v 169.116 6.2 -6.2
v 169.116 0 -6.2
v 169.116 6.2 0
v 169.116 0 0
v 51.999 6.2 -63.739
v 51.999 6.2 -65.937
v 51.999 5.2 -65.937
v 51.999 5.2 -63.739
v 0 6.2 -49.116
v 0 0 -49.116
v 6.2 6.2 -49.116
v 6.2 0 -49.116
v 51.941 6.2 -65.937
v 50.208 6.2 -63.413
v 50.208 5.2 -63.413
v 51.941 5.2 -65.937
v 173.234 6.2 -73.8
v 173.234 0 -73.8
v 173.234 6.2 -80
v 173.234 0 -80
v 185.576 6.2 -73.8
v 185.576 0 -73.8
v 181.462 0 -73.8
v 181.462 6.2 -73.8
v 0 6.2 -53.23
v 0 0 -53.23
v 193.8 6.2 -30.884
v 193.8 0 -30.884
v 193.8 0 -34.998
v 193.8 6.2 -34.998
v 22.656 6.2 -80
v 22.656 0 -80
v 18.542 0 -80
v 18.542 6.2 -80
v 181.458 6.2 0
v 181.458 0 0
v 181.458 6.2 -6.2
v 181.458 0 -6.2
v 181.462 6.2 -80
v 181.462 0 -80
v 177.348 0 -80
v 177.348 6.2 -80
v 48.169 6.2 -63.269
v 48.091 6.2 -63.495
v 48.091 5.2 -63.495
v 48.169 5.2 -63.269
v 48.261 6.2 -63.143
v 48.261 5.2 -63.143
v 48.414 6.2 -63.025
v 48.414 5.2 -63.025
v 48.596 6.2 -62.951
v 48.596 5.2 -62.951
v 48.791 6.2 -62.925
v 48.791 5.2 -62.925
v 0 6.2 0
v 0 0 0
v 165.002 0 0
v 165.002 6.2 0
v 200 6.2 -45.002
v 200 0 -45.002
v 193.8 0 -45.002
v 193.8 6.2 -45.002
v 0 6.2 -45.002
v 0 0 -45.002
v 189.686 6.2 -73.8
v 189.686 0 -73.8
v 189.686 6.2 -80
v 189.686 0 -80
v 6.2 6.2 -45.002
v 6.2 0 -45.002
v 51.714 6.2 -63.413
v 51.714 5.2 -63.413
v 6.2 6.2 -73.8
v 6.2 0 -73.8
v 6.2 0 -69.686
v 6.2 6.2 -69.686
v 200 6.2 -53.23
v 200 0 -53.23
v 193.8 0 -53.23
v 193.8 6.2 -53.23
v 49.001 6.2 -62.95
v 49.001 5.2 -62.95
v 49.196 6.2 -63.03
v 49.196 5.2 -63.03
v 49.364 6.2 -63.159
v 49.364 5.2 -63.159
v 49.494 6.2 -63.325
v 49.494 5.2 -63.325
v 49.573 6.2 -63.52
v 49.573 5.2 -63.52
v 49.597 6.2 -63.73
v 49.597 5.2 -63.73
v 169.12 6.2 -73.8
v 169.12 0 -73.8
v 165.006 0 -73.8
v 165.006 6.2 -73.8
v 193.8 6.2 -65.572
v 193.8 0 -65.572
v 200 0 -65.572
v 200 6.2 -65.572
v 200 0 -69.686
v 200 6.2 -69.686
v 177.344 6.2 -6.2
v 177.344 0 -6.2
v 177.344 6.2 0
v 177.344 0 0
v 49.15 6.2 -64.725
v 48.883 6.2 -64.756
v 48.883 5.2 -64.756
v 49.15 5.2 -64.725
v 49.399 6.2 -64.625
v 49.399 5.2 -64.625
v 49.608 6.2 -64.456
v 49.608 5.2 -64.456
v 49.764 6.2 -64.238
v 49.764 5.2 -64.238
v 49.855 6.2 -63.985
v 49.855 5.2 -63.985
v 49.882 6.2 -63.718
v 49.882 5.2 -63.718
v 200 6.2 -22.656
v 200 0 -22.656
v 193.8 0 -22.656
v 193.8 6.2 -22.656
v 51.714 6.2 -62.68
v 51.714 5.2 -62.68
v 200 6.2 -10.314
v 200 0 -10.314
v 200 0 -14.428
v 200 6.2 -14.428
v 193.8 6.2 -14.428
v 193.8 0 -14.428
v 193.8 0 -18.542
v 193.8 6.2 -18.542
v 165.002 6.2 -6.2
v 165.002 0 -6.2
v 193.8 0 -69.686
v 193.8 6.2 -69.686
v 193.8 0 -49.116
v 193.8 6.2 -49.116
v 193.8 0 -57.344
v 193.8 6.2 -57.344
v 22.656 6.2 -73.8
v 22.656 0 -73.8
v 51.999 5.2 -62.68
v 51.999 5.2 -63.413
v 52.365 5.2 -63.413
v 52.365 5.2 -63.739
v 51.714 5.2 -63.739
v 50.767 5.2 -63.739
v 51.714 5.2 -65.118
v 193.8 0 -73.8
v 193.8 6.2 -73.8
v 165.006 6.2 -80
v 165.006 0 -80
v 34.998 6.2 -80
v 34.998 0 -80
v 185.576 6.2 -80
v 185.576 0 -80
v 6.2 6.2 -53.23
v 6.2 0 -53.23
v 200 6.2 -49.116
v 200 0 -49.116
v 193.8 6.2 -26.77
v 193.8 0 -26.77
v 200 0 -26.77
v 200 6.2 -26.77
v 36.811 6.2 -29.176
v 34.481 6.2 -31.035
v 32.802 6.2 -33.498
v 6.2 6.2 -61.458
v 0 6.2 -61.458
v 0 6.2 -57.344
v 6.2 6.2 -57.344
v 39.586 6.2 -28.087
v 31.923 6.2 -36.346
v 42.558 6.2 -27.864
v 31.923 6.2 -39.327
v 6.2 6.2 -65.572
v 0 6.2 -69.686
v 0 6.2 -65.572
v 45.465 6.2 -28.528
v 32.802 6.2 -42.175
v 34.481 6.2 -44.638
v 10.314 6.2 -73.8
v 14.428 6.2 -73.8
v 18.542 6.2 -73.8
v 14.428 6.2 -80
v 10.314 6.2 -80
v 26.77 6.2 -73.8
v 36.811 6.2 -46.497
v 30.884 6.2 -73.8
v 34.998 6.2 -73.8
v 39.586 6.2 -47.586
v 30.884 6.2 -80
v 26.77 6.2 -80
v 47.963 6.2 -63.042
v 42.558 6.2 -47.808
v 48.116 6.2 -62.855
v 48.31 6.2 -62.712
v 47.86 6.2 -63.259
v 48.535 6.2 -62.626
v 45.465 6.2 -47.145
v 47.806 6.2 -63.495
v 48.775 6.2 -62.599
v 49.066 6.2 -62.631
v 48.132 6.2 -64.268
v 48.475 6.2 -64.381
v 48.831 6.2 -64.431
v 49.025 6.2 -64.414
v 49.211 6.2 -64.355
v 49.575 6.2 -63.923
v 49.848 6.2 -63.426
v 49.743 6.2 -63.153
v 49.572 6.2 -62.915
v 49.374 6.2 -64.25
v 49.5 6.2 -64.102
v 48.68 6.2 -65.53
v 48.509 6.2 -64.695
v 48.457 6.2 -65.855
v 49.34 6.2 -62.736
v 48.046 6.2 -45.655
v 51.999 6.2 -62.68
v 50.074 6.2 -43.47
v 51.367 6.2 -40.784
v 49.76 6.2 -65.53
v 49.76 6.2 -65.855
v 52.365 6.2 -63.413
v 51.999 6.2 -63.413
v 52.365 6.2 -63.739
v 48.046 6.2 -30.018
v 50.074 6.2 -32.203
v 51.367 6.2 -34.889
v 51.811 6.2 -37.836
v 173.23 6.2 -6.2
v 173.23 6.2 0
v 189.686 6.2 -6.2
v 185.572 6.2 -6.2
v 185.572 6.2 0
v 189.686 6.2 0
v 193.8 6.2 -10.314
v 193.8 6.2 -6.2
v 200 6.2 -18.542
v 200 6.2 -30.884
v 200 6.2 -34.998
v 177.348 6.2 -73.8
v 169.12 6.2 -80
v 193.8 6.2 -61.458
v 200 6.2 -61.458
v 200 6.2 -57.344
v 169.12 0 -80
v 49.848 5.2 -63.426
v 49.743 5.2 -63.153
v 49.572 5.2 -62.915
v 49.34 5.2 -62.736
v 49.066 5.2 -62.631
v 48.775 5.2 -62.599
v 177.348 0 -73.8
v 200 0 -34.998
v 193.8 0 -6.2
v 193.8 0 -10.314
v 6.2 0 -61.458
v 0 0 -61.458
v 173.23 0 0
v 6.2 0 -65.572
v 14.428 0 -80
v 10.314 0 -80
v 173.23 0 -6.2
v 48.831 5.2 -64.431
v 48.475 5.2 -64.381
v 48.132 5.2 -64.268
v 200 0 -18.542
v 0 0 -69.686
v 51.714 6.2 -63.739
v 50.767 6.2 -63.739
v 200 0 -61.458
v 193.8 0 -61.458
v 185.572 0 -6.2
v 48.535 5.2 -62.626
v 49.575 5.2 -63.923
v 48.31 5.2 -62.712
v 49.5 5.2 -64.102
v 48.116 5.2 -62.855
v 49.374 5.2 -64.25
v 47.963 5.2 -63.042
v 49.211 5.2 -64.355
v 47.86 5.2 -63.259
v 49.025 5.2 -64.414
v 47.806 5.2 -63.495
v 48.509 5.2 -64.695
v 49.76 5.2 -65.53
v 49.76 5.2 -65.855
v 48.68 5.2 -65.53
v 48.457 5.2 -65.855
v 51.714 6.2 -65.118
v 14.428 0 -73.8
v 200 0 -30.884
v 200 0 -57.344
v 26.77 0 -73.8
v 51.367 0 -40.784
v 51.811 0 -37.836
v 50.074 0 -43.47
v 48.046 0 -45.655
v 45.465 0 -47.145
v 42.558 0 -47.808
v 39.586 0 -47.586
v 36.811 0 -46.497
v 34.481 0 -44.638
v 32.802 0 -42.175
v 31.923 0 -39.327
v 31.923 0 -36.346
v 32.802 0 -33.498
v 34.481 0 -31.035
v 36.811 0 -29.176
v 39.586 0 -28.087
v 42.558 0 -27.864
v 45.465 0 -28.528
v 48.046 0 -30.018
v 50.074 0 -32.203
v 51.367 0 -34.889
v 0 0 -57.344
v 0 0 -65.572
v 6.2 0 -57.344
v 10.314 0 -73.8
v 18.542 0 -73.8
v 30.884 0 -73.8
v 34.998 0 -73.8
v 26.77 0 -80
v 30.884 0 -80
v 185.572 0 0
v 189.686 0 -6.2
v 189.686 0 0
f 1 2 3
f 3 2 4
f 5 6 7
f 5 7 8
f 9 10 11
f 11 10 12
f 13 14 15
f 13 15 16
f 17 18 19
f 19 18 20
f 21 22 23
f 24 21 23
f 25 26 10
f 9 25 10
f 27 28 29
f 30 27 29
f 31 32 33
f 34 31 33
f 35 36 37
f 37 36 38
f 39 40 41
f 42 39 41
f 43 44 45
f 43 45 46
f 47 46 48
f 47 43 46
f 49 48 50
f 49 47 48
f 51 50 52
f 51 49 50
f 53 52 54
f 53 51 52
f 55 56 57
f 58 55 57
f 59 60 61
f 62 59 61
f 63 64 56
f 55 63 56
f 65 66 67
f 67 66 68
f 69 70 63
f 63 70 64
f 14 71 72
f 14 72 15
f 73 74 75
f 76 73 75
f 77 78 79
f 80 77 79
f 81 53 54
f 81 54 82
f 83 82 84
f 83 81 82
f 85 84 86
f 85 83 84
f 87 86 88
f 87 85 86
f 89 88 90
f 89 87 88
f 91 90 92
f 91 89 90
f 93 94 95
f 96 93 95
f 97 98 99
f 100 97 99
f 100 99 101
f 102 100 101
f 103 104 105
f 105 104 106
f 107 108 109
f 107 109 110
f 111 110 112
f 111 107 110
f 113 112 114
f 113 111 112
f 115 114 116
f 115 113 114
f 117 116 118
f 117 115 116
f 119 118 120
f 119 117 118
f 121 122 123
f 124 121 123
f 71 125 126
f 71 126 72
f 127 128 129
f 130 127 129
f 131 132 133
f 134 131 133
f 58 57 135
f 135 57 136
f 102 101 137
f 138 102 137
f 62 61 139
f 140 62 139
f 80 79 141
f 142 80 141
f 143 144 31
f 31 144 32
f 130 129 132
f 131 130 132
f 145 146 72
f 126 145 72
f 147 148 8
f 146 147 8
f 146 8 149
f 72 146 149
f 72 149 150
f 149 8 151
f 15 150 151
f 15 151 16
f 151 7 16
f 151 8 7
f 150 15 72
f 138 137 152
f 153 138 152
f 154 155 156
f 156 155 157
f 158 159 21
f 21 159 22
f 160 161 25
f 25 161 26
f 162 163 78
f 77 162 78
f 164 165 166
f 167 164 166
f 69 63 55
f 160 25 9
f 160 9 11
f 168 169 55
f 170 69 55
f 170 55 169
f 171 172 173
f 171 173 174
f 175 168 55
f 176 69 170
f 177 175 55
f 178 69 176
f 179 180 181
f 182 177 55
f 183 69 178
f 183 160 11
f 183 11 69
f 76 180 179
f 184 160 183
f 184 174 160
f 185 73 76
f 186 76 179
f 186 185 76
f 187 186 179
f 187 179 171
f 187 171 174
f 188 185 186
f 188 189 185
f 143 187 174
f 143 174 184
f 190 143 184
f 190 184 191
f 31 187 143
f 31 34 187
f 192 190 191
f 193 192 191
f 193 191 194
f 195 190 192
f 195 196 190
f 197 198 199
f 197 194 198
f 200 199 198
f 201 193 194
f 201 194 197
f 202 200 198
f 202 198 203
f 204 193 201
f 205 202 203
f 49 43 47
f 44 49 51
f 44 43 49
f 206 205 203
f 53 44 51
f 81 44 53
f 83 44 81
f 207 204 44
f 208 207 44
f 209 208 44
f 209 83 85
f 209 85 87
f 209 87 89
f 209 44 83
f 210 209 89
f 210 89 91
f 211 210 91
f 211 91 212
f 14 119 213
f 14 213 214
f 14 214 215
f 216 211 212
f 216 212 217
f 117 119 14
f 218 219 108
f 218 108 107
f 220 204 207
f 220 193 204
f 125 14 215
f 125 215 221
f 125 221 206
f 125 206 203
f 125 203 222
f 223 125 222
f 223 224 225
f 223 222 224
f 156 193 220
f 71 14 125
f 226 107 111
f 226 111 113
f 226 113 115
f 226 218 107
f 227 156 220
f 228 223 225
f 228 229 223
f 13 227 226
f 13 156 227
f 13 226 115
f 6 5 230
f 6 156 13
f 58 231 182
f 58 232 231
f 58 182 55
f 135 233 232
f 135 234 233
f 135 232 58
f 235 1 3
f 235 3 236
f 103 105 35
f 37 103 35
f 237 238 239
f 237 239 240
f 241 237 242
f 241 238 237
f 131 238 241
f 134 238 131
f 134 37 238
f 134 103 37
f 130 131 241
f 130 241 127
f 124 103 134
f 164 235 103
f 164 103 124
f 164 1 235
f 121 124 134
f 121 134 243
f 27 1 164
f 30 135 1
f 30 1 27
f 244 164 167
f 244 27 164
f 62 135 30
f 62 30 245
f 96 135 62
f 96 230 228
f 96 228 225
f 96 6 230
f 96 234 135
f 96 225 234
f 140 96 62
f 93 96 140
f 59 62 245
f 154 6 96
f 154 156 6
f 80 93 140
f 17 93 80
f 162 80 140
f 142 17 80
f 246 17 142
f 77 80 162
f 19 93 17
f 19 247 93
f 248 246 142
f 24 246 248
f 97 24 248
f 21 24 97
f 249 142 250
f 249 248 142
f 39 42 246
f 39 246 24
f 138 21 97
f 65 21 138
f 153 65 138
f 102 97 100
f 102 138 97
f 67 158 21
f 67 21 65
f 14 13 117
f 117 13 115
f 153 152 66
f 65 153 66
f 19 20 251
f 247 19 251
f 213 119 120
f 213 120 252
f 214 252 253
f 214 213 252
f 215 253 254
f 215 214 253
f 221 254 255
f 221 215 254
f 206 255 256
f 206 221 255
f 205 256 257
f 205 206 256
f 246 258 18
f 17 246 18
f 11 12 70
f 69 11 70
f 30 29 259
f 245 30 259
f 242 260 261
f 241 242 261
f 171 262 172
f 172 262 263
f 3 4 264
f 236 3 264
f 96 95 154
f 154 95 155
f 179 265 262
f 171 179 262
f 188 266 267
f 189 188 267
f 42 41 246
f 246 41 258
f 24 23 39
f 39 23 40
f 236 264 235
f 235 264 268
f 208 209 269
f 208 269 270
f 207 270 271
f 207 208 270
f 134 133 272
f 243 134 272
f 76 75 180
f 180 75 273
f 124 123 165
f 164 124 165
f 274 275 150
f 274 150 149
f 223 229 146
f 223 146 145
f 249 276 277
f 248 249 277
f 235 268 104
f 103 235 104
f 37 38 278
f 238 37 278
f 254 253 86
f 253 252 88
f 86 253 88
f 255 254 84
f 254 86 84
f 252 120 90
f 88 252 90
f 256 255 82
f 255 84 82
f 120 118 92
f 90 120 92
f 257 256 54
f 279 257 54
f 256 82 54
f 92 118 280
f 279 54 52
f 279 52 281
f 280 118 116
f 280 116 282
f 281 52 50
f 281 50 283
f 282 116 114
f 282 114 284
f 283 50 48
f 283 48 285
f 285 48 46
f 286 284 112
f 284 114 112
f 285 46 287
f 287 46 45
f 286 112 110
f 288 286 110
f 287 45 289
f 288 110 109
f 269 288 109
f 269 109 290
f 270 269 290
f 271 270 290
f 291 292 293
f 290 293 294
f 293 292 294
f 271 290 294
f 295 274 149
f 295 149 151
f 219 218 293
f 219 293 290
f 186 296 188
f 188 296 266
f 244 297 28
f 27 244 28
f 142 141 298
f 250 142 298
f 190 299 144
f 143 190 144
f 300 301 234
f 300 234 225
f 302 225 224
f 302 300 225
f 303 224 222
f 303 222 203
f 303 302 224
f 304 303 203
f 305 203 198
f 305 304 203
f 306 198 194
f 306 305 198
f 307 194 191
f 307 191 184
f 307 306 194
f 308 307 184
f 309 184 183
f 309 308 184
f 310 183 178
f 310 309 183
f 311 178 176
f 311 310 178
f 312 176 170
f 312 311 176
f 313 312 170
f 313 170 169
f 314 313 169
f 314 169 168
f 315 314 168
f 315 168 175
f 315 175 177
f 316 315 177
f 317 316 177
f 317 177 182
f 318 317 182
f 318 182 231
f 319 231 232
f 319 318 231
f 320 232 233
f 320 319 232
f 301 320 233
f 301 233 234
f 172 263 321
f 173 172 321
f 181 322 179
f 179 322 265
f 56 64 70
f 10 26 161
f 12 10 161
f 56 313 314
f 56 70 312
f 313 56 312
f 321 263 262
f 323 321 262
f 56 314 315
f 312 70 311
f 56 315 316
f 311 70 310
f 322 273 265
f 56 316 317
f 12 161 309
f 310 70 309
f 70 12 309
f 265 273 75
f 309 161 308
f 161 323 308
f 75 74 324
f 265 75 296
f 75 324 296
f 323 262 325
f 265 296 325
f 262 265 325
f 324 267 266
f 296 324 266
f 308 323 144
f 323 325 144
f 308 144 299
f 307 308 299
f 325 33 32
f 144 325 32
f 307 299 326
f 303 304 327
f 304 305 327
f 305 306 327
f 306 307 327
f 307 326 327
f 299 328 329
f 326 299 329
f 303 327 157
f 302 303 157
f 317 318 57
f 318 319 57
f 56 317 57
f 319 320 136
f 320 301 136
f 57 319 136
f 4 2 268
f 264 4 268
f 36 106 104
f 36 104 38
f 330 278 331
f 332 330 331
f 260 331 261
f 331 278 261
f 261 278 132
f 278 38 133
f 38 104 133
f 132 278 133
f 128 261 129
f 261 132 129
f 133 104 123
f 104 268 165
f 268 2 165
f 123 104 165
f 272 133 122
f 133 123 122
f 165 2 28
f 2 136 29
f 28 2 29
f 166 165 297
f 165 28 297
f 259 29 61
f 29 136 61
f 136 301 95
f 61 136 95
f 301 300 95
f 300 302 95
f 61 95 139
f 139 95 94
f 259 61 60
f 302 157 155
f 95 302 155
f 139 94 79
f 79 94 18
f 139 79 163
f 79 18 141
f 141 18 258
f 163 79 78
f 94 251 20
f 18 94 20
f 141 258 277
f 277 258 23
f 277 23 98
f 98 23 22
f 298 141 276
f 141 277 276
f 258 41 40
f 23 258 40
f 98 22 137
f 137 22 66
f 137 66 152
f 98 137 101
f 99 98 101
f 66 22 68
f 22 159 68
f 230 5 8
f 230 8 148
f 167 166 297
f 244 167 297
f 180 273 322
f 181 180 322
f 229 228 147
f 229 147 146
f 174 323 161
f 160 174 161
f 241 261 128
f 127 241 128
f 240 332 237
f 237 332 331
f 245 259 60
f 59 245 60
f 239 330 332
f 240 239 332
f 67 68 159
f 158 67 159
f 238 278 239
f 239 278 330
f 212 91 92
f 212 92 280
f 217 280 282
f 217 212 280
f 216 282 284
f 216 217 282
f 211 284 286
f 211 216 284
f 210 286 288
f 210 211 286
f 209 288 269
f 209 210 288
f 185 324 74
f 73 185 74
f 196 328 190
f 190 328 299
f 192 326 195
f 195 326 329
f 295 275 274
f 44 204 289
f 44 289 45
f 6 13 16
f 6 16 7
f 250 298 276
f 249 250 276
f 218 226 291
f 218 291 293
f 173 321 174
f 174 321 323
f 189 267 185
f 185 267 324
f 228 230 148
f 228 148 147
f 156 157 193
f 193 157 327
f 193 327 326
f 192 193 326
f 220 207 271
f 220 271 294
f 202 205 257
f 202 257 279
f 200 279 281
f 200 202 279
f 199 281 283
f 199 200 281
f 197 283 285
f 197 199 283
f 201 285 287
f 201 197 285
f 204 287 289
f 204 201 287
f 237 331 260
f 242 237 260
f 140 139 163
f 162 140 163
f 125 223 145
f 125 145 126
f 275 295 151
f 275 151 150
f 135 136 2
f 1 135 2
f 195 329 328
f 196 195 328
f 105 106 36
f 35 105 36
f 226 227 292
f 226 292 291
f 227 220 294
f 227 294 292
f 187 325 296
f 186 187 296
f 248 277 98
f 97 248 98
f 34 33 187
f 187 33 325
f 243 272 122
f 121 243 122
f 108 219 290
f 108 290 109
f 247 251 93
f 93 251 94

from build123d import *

# Parameters (mm, degrees)
SKETCH1_R           = 10
BOSS_EXTRUDE1_DEPTH = 6.2
CUT_EXTRUDE1_DEPTH  = 1


with BuildPart() as part:
    # Sketch1 → Boss-Extrude1 (new body)
    with BuildSketch(Plane(origin=(0, 0, 0), x_dir=(1, 0, 0), z_dir=(0, 1, 0))):
        Polygon((0, 45.002), (0, 0), (165.002, 0), (165.002, 6.2), (169.116, 6.2), (169.116, 0), (173.23, 0), (173.23, 6.2), (177.344, 6.2), (177.344, 0), (181.458, 0), (181.458, 6.2), (185.572, 6.2), (185.572, 0), (189.686, 0), (189.686, 6.2), (193.8, 6.2), (193.8, 10.314), (200, 10.314), (200, 14.428), (193.8, 14.428), (193.8, 18.542), (200, 18.542), (200, 22.656), (193.8, 22.656), (193.8, 26.77), (200, 26.77), (200, 30.884), (193.8, 30.884), (193.8, 34.998), (200, 34.998), (200, 45.002), (193.8, 45.002), (193.8, 49.116), (200, 49.116), (200, 53.23), (193.8, 53.23), (193.8, 57.344), (200, 57.344), (200, 61.458), (193.8, 61.458), (193.8, 65.572), (200, 65.572), (200, 69.686), (193.8, 69.686), (193.8, 73.8), (189.686, 73.8), (189.686, 80), (185.576, 80), (185.576, 73.8), (181.462, 73.8), (181.462, 80), (177.348, 80), (177.348, 73.8), (173.234, 73.8), (173.234, 80), (169.12, 80), (169.12, 73.8), (165.006, 73.8), (165.006, 80), (34.998, 80), (34.998, 73.8), (30.884, 73.8), (30.884, 80), (26.77, 80), (26.77, 73.8), (22.656, 73.8), (22.656, 80), (18.542, 80), (18.542, 73.8), (14.428, 73.8), (14.428, 80), (10.314, 80), (10.314, 73.8), (6.2, 73.8), (6.2, 69.686), (0, 69.686), (0, 65.572), (6.2, 65.572), (6.2, 61.458), (0, 61.458), (0, 57.344), (6.2, 57.344), (6.2, 53.23), (0, 53.23), (0, 49.116), (6.2, 49.116), (6.2, 45.002), align=None)
        with Locations((41.81119745, 37.836428286)):
            Circle(SKETCH1_R, mode=Mode.SUBTRACT)
    extrude(amount=BOSS_EXTRUDE1_DEPTH)

    # Sketch2 → Cut-Extrude1 (cut)
    with BuildSketch(Plane(origin=(0, 6.2, 0), x_dir=(1, 0, 0), z_dir=(0, 1, 0))):
        with BuildLine():
            Line((49.75994289, 65.855432978), (49.75994289, 65.529791952))
            Line((49.75994289, 65.529791952), (48.679984958, 65.529791952))
            Line((48.679984958, 65.529791952), (48.508896216, 64.694700807))
            add(Edge.make_bspline(
                [(48.508896216, 64.694700807), (48.542511188, 64.703981125), (48.607634879, 64.721960273), (48.70375561, 64.74192265), (48.795007109, 64.753956303), (48.854221195, 64.755599421), (48.882874581, 64.756394517)],
                knots=[0, 0, 0, 0, 0.000104595, 0.000202637, 0.000294305, 0.000380252, 0.000380252, 0.000380252, 0.000380252], degree=3))
            add(Edge.make_bspline(
                [(48.882874581, 64.756394517), (48.918329116, 64.755627132), (48.988041591, 64.754118262), (49.090039779, 64.739629513), (49.187406046, 64.716824019), (49.279936768, 64.684964689), (49.367803124, 64.644225145), (49.450196698, 64.593334485), (49.528354233, 64.533886392), (49.600873586, 64.465537702), (49.666663495, 64.39031595), (49.724508357, 64.309437024), (49.773641564, 64.22368693), (49.813157391, 64.132246378), (49.844711752, 64.036126289), (49.865713918, 63.934315303), (49.879699076, 63.82777308), (49.881261526, 63.754925363), (49.882058275, 63.71777773)],
                knots=[0, 0, 0, 0, 0.000106308, 0.000209029, 0.000308378, 0.000405929, 0.000502102, 0.000598312, 0.00069588, 0.000796219, 0.000896736, 0.000995218, 0.001094066, 0.001192613, 0.001293582, 0.001396995, 0.001504047, 0.001615439, 0.001615439, 0.001615439, 0.001615439], degree=3))
            add(Edge.make_bspline(
                [(49.882058275, 63.71777773), (49.881454957, 63.691904001), (49.880256474, 63.640506205), (49.874161755, 63.564175395), (49.862427212, 63.489460539), (49.846672205, 63.416351726), (49.826223012, 63.344987367), (49.801467942, 63.275163196), (49.771172974, 63.207313802), (49.737943083, 63.140797194), (49.700526636, 63.07711712), (49.65899899, 63.01756411), (49.61512458, 62.961244798), (49.567915609, 62.908763197), (49.516933277, 62.860464174), (49.462795022, 62.81606109), (49.405932841, 62.774803026), (49.345467014, 62.738364735), (49.282744904, 62.704834053), (49.216860736, 62.677326273), (49.149314243, 62.652733151), (49.079133249, 62.633130222), (49.006476719, 62.617769976), (48.931224887, 62.607337289), (48.853772422, 62.599738663), (48.801271518, 62.599262997), (48.774751584, 62.599022722)],
                knots=[0, 0, 0, 0, 7.7636e-05, 0.000154223, 0.000229512, 0.000304362, 0.000378447, 0.000452077, 0.000526407, 0.000601214, 0.00067506, 0.000747747, 0.00081887, 0.000889121, 0.000959302, 0.001029336, 0.001099058, 0.00116985, 0.001240974, 0.00131221, 0.00138383, 0.001456517, 0.001530612, 0.001606437, 0.001684346, 0.001763871, 0.001763871, 0.001763871, 0.001763871], degree=3))
            add(Edge.make_bspline(
                [(48.774751584, 62.599022722), (48.74311572, 62.59964941), (48.680875895, 62.600882346), (48.589689381, 62.613780544), (48.501955417, 62.632253525), (48.418380254, 62.660044998), (48.338214893, 62.694867759), (48.262538571, 62.738878857), (48.189417617, 62.788752758), (48.121824555, 62.847608507), (48.059090081, 62.911939162), (48.002932033, 62.981750736), (47.952918003, 63.055891016), (47.909848904, 63.134720055), (47.873111413, 63.218030723), (47.844250674, 63.306135159), (47.820956738, 63.39857302), (47.811102063, 63.462212276), (47.806096737, 63.494535542)],
                knots=[0, 0, 0, 0, 9.4843e-05, 0.000186593, 0.000275792, 0.000363484, 0.000450342, 0.000537514, 0.000625728, 0.000715478, 0.000805885, 0.000894984, 0.00098389, 0.001073836, 0.001164117, 0.001256635, 0.001351658, 0.001449737, 0.001449737, 0.001449737, 0.001449737], degree=3))
            Line((47.806096737, 63.494535542), (48.091032634, 63.494535542))
            add(Edge.make_bspline(
                [(48.091032634, 63.494535542), (48.09804354, 63.464258332), (48.11151889, 63.406063852), (48.141096962, 63.32430185), (48.177261006, 63.25144084), (48.220263522, 63.186517003), (48.271562478, 63.129903127), (48.330099889, 63.079450507), (48.395729609, 63.033934497), (48.468657753, 62.995995272), (48.545595332, 62.963638617), (48.626119873, 62.942092437), (48.708038815, 62.926942341), (48.763445623, 62.925425815), (48.791288043, 62.924663747)],
                knots=[0, 0, 0, 0, 9.3172e-05, 0.000179081, 0.000260145, 0.000336703, 0.000411917, 0.000488562, 0.000568128, 0.000650923, 0.00073478, 0.000817953, 0.000900557, 0.000983994, 0.000983994, 0.000983994, 0.000983994], degree=3))
            add(Edge.make_bspline(
                [(48.791288043, 62.924663747), (48.818464632, 62.92540831), (48.871975557, 62.92687436), (48.950725887, 62.938158321), (49.026756137, 62.955536975), (49.099316096, 62.981544629), (49.169675493, 63.013153767), (49.236054556, 63.053716729), (49.300373595, 63.100398317), (49.360633401, 63.153880403), (49.415823473, 63.212817197), (49.464587955, 63.275843118), (49.505207012, 63.343077686), (49.539437239, 63.413356903), (49.565429874, 63.487451023), (49.583972765, 63.565012803), (49.594861254, 63.646233821), (49.59635911, 63.701632409), (49.597122378, 63.729862065)],
                knots=[0, 0, 0, 0, 8.15e-05, 0.000160473, 0.000238226, 0.000315066, 0.000391338, 0.000469218, 0.000547964, 0.000629516, 0.000710512, 0.000789892, 0.000868102, 0.000945761, 0.001024012, 0.00110315, 0.001184644, 0.001269321, 0.001269321, 0.001269321, 0.001269321], degree=3))
            add(Edge.make_bspline(
                [(49.597122378, 63.729862065), (49.596525043, 63.755330782), (49.595355845, 63.805182173), (49.585803113, 63.878115739), (49.569187002, 63.947124856), (49.546123911, 64.012542768), (49.516841786, 64.074431176), (49.481058346, 64.132853952), (49.438102049, 64.187041073), (49.389032979, 64.237017889), (49.33527747, 64.283141454), (49.275910647, 64.322460733), (49.212174856, 64.355538715), (49.144838005, 64.384084685), (49.072298418, 64.40458679), (48.995992616, 64.419979086), (48.915096602, 64.428883022), (48.859787478, 64.430118449), (48.831357153, 64.430753491)],
                knots=[0, 0, 0, 0, 7.6388e-05, 0.000149519, 0.000220172, 0.000288967, 0.000357247, 0.000425206, 0.000494043, 0.000564207, 0.000635056, 0.000706145, 0.000777268, 0.000850264, 0.000925136, 0.001002969, 0.001083601, 0.001168886, 0.001168886, 0.001168886, 0.001168886], degree=3))
            add(Edge.make_bspline(
                [(48.831357153, 64.430753491), (48.806747339, 64.430226812), (48.755934317, 64.429139353), (48.677990038, 64.421132459), (48.596082547, 64.408215385), (48.510525826, 64.390447861), (48.421062936, 64.367196813), (48.327882673, 64.339334373), (48.230789117, 64.306022274), (48.165368038, 64.280865194), (48.131737762, 64.267932978)],
                knots=[0, 0, 0, 0, 7.3822e-05, 0.000152423, 0.000234822, 0.000322511, 0.00041445, 0.000512043, 0.000614219, 0.000722306, 0.000722306, 0.000722306, 0.000722306], degree=3))
            Line((48.131737762, 64.267932978), (48.457378788, 65.855432978))
            Line((48.457378788, 65.855432978), (49.75994289, 65.855432978))
        make_face()
        Polygon((51.940847338, 65.936843234), (51.998724942, 65.936843234), (51.998724942, 63.738766311), (52.365071096, 63.738766311), (52.365071096, 63.413125286), (51.998724942, 63.413125286), (51.998724942, 62.680432978), (51.713789044, 62.680432978), (51.713789044, 63.413125286), (50.207699301, 63.413125286), align=None)
        Polygon((51.713789044, 63.738766311), (51.713789044, 65.117652529), (50.767394814, 63.738766311), align=None, mode=Mode.SUBTRACT)
    extrude(amount=-CUT_EXTRUDE1_DEPTH, mode=Mode.SUBTRACT)


solid = part.part
